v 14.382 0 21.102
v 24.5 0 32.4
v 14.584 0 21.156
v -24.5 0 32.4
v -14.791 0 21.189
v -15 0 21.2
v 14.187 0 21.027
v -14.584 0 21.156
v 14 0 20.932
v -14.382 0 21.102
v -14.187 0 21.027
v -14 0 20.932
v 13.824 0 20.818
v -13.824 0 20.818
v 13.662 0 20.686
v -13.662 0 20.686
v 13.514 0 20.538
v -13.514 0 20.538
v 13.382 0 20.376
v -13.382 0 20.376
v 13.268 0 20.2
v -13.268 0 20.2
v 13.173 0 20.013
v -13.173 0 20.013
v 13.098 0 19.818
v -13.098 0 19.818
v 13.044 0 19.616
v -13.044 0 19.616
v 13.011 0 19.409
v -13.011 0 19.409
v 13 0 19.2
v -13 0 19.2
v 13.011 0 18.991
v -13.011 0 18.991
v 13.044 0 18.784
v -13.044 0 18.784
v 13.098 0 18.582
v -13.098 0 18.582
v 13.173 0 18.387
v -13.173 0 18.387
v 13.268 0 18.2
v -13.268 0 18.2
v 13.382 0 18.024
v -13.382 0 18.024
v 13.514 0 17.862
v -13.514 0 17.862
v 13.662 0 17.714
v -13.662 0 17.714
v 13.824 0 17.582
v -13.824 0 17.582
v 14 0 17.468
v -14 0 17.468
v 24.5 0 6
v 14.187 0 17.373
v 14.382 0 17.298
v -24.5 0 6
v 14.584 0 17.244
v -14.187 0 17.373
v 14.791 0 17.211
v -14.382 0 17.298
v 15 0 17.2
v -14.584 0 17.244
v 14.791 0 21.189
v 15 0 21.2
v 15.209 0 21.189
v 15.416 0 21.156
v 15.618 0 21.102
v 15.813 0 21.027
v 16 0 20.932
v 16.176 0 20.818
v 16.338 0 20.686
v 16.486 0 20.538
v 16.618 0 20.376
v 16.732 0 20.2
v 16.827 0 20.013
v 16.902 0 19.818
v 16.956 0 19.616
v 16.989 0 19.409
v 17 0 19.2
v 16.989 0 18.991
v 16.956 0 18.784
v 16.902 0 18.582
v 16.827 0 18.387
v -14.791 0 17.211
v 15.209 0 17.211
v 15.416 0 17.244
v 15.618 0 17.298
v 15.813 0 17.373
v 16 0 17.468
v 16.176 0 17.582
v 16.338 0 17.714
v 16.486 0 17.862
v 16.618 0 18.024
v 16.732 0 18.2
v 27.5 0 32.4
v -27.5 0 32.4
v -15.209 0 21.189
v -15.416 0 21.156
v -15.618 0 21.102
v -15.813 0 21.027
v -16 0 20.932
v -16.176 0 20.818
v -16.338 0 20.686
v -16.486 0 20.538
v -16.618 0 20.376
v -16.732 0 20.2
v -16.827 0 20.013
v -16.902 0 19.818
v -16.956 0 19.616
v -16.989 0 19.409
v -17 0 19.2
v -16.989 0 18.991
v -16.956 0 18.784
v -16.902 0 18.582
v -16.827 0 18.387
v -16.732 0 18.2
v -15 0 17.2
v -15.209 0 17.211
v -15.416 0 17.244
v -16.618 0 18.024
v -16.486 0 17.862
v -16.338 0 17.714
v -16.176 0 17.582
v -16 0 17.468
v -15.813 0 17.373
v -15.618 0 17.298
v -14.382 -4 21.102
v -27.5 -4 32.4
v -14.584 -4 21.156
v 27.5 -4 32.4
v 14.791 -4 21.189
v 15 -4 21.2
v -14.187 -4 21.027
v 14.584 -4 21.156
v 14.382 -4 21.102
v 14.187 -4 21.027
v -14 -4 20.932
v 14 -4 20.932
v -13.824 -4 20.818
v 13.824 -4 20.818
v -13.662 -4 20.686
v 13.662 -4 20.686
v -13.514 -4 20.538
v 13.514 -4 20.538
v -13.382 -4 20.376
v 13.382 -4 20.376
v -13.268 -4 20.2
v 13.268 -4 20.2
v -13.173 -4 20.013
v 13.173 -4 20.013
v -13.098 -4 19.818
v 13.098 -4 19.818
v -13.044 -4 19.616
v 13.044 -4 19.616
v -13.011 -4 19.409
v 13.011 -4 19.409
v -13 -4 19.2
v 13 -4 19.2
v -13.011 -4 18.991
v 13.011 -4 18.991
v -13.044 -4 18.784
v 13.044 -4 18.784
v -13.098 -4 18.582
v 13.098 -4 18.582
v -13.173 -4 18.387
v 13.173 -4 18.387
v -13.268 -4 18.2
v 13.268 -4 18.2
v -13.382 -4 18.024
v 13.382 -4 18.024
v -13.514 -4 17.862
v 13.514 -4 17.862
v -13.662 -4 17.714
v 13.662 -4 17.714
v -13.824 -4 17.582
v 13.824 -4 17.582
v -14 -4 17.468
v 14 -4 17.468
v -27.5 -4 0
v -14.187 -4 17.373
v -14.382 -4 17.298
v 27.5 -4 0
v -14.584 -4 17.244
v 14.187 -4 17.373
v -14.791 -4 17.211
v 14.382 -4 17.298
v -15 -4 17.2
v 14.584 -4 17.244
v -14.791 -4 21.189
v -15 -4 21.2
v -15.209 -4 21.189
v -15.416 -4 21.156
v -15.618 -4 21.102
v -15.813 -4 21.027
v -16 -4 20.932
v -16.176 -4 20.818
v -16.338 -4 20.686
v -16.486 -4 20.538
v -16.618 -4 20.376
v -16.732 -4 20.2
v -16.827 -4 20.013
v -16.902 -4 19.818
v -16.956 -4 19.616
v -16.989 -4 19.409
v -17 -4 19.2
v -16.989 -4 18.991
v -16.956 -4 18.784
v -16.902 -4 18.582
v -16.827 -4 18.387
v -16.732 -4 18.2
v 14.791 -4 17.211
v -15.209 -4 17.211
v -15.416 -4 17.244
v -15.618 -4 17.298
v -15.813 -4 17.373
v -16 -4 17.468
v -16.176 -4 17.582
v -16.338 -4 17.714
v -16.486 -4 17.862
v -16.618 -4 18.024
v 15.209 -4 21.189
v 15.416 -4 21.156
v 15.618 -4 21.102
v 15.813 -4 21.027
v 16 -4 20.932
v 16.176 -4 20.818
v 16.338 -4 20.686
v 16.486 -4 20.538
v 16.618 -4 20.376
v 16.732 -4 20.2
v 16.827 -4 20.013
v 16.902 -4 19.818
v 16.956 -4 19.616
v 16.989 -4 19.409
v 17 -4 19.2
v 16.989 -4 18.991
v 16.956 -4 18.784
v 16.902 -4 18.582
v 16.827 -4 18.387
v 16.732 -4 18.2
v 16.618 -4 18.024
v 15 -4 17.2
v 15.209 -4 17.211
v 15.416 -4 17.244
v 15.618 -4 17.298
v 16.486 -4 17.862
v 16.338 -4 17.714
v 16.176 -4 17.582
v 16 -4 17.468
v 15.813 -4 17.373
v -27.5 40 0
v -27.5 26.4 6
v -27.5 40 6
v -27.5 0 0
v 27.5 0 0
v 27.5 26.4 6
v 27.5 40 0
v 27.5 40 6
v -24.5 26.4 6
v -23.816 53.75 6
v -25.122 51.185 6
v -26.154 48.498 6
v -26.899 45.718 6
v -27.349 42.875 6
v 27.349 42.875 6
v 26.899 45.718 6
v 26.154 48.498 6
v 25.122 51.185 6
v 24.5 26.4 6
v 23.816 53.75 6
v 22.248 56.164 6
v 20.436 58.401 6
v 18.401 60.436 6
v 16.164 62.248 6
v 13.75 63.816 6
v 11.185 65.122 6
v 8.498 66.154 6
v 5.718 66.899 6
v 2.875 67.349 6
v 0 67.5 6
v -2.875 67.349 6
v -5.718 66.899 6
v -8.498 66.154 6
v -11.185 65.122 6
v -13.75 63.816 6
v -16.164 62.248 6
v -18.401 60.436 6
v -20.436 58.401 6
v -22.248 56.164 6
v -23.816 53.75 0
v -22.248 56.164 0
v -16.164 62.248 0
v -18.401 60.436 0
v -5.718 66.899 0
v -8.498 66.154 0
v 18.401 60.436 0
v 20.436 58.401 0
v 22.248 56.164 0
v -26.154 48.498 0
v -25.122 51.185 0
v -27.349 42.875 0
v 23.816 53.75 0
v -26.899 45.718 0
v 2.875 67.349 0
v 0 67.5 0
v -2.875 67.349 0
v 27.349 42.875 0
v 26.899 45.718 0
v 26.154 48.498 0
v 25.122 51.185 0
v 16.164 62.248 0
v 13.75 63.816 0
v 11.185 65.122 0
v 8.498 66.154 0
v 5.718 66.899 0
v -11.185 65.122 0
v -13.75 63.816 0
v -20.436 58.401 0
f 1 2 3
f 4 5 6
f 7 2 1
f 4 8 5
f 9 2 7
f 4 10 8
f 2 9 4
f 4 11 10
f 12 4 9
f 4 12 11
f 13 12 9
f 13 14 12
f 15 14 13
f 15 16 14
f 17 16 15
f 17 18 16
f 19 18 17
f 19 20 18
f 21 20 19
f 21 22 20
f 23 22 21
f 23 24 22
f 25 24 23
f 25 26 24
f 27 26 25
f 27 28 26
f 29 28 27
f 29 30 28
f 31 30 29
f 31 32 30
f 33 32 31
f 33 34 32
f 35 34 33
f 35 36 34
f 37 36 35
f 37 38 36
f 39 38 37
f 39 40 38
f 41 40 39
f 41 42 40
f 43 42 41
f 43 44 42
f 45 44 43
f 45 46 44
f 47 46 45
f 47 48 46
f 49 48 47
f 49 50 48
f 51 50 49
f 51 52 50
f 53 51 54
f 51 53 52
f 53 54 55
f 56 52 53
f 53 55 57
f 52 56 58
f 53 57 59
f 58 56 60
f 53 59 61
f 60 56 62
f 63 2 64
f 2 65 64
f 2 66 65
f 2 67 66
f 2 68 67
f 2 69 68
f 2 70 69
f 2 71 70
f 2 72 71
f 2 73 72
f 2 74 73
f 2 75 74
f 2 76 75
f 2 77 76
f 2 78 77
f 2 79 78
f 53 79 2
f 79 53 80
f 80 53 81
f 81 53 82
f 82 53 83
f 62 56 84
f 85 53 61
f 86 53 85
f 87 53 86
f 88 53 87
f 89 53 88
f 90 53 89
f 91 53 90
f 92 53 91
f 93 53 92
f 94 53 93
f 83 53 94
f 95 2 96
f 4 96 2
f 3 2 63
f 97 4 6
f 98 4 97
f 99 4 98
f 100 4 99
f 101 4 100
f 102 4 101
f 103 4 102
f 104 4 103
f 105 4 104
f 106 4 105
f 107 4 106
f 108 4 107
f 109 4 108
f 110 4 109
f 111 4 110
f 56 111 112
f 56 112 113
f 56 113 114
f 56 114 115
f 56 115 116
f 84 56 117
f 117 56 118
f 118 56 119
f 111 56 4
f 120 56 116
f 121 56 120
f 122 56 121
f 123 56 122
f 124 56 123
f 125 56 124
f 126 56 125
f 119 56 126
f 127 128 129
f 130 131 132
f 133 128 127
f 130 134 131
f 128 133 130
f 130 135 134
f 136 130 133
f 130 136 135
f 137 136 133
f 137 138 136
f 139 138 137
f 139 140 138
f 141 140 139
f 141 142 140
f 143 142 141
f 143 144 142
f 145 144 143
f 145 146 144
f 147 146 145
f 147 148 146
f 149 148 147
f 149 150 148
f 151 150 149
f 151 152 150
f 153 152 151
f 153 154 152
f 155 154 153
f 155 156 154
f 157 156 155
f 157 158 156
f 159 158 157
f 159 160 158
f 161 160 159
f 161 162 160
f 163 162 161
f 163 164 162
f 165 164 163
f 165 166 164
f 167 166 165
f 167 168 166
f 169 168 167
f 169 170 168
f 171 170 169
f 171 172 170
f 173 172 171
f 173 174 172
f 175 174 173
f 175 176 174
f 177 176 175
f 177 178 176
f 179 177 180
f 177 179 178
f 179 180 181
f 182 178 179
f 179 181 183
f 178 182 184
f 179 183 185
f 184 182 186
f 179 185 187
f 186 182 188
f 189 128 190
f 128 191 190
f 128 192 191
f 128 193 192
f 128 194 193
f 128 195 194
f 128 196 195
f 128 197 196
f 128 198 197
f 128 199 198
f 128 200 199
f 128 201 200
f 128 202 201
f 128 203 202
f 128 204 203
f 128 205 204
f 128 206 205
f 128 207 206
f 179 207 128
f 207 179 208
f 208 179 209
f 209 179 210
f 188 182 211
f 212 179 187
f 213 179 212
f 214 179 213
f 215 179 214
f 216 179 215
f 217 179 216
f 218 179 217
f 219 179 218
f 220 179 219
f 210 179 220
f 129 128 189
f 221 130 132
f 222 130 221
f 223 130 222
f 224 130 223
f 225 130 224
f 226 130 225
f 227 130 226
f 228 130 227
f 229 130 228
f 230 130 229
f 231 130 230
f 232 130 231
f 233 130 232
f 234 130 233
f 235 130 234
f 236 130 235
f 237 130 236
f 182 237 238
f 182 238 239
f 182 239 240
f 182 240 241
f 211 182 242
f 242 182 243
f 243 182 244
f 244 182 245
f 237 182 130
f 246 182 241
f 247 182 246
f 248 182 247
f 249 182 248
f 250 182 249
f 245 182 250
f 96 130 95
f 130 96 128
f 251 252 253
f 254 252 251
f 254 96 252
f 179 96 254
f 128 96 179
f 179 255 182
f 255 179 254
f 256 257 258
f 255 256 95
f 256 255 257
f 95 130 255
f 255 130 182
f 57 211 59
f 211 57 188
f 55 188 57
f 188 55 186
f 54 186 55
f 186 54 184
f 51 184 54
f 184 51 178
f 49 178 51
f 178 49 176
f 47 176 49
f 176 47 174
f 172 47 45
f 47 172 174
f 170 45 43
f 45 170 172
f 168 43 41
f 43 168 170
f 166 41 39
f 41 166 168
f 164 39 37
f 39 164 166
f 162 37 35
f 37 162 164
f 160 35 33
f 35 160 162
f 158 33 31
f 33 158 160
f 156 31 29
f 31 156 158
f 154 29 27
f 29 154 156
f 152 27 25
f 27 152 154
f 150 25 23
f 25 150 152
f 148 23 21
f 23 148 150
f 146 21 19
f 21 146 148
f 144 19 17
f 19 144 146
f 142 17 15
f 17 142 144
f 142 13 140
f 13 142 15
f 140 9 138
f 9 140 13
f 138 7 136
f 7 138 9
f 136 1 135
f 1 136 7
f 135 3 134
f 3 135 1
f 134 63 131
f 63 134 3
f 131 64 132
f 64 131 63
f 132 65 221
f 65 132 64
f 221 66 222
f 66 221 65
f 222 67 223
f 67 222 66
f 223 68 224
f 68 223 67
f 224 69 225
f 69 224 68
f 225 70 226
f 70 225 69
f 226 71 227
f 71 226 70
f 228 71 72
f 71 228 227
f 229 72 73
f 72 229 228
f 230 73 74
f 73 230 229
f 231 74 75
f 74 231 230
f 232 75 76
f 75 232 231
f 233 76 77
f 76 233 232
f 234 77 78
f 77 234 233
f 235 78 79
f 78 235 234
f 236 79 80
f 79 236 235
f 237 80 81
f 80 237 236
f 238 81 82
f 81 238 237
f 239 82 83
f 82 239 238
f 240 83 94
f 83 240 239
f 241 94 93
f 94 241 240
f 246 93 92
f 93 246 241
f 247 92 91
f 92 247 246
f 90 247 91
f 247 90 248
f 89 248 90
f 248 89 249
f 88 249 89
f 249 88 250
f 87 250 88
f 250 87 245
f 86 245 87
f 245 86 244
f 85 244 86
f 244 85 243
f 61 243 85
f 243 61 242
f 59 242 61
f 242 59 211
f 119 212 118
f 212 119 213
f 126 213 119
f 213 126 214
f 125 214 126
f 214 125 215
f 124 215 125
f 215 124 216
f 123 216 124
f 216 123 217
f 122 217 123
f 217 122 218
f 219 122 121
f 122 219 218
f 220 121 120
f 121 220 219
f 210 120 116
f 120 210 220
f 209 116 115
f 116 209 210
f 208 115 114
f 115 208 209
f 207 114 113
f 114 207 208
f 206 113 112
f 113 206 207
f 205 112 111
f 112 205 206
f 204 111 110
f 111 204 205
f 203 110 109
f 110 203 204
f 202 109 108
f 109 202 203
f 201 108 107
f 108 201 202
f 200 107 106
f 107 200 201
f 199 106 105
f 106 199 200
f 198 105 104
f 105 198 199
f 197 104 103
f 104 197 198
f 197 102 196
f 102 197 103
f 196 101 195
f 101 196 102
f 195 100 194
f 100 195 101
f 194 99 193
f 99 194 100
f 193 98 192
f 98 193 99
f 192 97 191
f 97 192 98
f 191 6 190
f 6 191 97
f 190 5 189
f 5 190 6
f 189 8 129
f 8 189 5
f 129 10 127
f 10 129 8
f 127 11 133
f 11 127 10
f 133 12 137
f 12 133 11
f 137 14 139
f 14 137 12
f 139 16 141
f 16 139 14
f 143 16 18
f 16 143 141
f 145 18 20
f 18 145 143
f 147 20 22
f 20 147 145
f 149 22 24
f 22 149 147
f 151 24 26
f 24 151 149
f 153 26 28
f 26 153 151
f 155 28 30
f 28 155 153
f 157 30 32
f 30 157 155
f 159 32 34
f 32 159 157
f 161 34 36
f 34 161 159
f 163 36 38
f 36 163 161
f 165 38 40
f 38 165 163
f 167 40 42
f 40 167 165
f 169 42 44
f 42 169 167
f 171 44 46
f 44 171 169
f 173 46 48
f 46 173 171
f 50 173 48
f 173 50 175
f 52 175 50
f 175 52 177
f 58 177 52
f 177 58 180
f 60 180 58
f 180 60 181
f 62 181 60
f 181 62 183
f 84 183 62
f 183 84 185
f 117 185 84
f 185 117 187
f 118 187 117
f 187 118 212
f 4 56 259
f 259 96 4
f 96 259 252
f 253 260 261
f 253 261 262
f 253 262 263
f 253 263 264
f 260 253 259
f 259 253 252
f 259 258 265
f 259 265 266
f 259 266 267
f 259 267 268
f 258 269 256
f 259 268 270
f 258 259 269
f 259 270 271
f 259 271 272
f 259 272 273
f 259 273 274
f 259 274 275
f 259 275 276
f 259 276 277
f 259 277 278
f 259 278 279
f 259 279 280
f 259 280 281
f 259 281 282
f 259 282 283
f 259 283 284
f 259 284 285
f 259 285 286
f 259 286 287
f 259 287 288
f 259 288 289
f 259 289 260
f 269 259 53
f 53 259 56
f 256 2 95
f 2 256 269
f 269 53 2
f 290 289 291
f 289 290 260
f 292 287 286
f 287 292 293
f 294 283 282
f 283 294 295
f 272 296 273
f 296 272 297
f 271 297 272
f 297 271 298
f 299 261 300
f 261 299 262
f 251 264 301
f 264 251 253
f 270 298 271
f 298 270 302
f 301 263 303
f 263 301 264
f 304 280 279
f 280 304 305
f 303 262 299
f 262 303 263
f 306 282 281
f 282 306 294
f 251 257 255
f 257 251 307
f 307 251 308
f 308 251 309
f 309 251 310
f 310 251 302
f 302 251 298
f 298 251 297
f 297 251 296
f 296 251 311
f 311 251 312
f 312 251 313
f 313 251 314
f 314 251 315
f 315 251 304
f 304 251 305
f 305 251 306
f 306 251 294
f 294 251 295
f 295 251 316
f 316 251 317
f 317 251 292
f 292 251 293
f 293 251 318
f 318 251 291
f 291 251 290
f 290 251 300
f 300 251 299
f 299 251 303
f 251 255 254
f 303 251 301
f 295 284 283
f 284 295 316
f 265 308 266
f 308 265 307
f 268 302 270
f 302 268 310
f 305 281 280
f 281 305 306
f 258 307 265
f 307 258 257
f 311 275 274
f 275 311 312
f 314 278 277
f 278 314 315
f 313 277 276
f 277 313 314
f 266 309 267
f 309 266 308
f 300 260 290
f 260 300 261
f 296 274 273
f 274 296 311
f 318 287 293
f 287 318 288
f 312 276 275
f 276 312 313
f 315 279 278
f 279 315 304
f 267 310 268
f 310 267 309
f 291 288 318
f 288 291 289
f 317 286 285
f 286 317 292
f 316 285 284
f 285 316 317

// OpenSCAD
back_thickness=6;
mount_thickness=4;
support_thickness=3;

mount_width = 26.4;

//bracket_length=40;
bracket_width=55;


//function bracket_length() = bracket_length;
function bracket_width() = bracket_width;
function bracket_back_thickness() = back_thickness;
function bracket_mount_thickness() = mount_thickness;
function bracket_support_thickness() = support_thickness;


/** BRACKET **/
module bracket(bracket_length) {    
    // mounting
    translate([0,0,(mount_width+back_thickness)/2]) rotate([90,0,0]) linear_extrude(mount_thickness) difference() {
        square([bracket_width, mount_width+back_thickness], center=true);
        translate([0,back_thickness/2]) {
            translate([15,0]) circle(d=4); 
            translate([-15,0]) circle(d=4);
        }
    }
    translate([-bracket_width/2+support_thickness, 0, back_thickness]) rotate([0,-90,0]) linear_extrude(support_thickness) support_profile();
    translate([bracket_width/2, 0, back_thickness]) rotate([0,-90,0]) linear_extrude(support_thickness) support_profile();
    
    // back
    linear_extrude(back_thickness) {
        translate([0,bracket_length/2,0]) square([bracket_width, bracket_length], center=true);
        translate([0,bracket_length,0]) circle(d=bracket_width);
    }
}

module support_profile() {
   polygon([[0,0], [mount_width,0], [0,mount_width]]);
} 


/** TESTING **/
bracket(bracket_length=40, $fn=60);
